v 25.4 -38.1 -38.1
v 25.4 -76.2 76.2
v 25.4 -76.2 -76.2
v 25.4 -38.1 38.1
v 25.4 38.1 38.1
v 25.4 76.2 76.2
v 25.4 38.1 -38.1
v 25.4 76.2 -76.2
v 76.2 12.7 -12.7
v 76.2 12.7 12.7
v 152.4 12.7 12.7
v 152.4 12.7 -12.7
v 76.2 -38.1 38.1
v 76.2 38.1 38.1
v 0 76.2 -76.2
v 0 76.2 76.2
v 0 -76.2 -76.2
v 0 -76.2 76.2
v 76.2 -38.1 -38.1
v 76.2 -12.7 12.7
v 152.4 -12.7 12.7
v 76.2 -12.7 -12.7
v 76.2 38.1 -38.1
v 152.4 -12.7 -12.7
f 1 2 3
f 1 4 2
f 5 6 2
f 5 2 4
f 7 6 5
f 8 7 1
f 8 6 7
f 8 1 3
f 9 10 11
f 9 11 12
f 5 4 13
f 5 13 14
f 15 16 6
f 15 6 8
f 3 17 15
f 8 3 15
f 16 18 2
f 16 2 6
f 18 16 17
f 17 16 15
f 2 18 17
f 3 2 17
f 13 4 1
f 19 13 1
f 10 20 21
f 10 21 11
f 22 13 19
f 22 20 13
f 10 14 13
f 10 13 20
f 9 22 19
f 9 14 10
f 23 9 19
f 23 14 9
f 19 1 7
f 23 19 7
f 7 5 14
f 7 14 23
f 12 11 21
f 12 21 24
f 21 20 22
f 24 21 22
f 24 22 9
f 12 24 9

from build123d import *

# Parameters (mm, degrees)
SKETCH1_W           = 25.4
SKETCH1_H           = 25.4
BOSS_EXTRUDE1_DEPTH = 152.4
SKETCH1_3_W         = 76.2
SKETCH1_3_H         = 76.2
SKETCH1_3_W_2       = 25.4
SKETCH1_3_H_2       = 25.4
BOSS_EXTRUDE2_DEPTH = 76.2
SKETCH1_5_W         = 152.4
SKETCH1_5_H         = 152.4
BOSS_EXTRUDE4_DEPTH = 25.4


with BuildPart() as part:
    # Sketch1 → Boss-Extrude1 (new body)
    with BuildSketch(Plane(origin=(0, 0, 0), x_dir=(0, 0, -1), z_dir=(1, 0, 0))):
        Rectangle(SKETCH1_W, SKETCH1_H)
    extrude(amount=BOSS_EXTRUDE1_DEPTH)



with BuildPart() as body_2:
    # Sketch1<3> → Boss-Extrude2 (new body)
    with BuildSketch(Plane(origin=(0, 0, 0), x_dir=(0, 0, -1), z_dir=(1, 0, 0))):
        Rectangle(SKETCH1_3_W, SKETCH1_3_H)
        Rectangle(SKETCH1_3_W_2, SKETCH1_3_H_2, mode=Mode.SUBTRACT)
    extrude(amount=BOSS_EXTRUDE2_DEPTH)


with BuildPart() as part_1:
    add(part.part)

    add(body_2.part)  # Boss-Extrude4 merges body 2
    # Sketch1<5> → Boss-Extrude4 (add)
    with BuildSketch(Plane(origin=(0, 0, 0), x_dir=(0, 0, -1), z_dir=(1, 0, 0))):
        Rectangle(SKETCH1_5_W, SKETCH1_5_H)
    extrude(amount=BOSS_EXTRUDE4_DEPTH)


solid = part_1.part
